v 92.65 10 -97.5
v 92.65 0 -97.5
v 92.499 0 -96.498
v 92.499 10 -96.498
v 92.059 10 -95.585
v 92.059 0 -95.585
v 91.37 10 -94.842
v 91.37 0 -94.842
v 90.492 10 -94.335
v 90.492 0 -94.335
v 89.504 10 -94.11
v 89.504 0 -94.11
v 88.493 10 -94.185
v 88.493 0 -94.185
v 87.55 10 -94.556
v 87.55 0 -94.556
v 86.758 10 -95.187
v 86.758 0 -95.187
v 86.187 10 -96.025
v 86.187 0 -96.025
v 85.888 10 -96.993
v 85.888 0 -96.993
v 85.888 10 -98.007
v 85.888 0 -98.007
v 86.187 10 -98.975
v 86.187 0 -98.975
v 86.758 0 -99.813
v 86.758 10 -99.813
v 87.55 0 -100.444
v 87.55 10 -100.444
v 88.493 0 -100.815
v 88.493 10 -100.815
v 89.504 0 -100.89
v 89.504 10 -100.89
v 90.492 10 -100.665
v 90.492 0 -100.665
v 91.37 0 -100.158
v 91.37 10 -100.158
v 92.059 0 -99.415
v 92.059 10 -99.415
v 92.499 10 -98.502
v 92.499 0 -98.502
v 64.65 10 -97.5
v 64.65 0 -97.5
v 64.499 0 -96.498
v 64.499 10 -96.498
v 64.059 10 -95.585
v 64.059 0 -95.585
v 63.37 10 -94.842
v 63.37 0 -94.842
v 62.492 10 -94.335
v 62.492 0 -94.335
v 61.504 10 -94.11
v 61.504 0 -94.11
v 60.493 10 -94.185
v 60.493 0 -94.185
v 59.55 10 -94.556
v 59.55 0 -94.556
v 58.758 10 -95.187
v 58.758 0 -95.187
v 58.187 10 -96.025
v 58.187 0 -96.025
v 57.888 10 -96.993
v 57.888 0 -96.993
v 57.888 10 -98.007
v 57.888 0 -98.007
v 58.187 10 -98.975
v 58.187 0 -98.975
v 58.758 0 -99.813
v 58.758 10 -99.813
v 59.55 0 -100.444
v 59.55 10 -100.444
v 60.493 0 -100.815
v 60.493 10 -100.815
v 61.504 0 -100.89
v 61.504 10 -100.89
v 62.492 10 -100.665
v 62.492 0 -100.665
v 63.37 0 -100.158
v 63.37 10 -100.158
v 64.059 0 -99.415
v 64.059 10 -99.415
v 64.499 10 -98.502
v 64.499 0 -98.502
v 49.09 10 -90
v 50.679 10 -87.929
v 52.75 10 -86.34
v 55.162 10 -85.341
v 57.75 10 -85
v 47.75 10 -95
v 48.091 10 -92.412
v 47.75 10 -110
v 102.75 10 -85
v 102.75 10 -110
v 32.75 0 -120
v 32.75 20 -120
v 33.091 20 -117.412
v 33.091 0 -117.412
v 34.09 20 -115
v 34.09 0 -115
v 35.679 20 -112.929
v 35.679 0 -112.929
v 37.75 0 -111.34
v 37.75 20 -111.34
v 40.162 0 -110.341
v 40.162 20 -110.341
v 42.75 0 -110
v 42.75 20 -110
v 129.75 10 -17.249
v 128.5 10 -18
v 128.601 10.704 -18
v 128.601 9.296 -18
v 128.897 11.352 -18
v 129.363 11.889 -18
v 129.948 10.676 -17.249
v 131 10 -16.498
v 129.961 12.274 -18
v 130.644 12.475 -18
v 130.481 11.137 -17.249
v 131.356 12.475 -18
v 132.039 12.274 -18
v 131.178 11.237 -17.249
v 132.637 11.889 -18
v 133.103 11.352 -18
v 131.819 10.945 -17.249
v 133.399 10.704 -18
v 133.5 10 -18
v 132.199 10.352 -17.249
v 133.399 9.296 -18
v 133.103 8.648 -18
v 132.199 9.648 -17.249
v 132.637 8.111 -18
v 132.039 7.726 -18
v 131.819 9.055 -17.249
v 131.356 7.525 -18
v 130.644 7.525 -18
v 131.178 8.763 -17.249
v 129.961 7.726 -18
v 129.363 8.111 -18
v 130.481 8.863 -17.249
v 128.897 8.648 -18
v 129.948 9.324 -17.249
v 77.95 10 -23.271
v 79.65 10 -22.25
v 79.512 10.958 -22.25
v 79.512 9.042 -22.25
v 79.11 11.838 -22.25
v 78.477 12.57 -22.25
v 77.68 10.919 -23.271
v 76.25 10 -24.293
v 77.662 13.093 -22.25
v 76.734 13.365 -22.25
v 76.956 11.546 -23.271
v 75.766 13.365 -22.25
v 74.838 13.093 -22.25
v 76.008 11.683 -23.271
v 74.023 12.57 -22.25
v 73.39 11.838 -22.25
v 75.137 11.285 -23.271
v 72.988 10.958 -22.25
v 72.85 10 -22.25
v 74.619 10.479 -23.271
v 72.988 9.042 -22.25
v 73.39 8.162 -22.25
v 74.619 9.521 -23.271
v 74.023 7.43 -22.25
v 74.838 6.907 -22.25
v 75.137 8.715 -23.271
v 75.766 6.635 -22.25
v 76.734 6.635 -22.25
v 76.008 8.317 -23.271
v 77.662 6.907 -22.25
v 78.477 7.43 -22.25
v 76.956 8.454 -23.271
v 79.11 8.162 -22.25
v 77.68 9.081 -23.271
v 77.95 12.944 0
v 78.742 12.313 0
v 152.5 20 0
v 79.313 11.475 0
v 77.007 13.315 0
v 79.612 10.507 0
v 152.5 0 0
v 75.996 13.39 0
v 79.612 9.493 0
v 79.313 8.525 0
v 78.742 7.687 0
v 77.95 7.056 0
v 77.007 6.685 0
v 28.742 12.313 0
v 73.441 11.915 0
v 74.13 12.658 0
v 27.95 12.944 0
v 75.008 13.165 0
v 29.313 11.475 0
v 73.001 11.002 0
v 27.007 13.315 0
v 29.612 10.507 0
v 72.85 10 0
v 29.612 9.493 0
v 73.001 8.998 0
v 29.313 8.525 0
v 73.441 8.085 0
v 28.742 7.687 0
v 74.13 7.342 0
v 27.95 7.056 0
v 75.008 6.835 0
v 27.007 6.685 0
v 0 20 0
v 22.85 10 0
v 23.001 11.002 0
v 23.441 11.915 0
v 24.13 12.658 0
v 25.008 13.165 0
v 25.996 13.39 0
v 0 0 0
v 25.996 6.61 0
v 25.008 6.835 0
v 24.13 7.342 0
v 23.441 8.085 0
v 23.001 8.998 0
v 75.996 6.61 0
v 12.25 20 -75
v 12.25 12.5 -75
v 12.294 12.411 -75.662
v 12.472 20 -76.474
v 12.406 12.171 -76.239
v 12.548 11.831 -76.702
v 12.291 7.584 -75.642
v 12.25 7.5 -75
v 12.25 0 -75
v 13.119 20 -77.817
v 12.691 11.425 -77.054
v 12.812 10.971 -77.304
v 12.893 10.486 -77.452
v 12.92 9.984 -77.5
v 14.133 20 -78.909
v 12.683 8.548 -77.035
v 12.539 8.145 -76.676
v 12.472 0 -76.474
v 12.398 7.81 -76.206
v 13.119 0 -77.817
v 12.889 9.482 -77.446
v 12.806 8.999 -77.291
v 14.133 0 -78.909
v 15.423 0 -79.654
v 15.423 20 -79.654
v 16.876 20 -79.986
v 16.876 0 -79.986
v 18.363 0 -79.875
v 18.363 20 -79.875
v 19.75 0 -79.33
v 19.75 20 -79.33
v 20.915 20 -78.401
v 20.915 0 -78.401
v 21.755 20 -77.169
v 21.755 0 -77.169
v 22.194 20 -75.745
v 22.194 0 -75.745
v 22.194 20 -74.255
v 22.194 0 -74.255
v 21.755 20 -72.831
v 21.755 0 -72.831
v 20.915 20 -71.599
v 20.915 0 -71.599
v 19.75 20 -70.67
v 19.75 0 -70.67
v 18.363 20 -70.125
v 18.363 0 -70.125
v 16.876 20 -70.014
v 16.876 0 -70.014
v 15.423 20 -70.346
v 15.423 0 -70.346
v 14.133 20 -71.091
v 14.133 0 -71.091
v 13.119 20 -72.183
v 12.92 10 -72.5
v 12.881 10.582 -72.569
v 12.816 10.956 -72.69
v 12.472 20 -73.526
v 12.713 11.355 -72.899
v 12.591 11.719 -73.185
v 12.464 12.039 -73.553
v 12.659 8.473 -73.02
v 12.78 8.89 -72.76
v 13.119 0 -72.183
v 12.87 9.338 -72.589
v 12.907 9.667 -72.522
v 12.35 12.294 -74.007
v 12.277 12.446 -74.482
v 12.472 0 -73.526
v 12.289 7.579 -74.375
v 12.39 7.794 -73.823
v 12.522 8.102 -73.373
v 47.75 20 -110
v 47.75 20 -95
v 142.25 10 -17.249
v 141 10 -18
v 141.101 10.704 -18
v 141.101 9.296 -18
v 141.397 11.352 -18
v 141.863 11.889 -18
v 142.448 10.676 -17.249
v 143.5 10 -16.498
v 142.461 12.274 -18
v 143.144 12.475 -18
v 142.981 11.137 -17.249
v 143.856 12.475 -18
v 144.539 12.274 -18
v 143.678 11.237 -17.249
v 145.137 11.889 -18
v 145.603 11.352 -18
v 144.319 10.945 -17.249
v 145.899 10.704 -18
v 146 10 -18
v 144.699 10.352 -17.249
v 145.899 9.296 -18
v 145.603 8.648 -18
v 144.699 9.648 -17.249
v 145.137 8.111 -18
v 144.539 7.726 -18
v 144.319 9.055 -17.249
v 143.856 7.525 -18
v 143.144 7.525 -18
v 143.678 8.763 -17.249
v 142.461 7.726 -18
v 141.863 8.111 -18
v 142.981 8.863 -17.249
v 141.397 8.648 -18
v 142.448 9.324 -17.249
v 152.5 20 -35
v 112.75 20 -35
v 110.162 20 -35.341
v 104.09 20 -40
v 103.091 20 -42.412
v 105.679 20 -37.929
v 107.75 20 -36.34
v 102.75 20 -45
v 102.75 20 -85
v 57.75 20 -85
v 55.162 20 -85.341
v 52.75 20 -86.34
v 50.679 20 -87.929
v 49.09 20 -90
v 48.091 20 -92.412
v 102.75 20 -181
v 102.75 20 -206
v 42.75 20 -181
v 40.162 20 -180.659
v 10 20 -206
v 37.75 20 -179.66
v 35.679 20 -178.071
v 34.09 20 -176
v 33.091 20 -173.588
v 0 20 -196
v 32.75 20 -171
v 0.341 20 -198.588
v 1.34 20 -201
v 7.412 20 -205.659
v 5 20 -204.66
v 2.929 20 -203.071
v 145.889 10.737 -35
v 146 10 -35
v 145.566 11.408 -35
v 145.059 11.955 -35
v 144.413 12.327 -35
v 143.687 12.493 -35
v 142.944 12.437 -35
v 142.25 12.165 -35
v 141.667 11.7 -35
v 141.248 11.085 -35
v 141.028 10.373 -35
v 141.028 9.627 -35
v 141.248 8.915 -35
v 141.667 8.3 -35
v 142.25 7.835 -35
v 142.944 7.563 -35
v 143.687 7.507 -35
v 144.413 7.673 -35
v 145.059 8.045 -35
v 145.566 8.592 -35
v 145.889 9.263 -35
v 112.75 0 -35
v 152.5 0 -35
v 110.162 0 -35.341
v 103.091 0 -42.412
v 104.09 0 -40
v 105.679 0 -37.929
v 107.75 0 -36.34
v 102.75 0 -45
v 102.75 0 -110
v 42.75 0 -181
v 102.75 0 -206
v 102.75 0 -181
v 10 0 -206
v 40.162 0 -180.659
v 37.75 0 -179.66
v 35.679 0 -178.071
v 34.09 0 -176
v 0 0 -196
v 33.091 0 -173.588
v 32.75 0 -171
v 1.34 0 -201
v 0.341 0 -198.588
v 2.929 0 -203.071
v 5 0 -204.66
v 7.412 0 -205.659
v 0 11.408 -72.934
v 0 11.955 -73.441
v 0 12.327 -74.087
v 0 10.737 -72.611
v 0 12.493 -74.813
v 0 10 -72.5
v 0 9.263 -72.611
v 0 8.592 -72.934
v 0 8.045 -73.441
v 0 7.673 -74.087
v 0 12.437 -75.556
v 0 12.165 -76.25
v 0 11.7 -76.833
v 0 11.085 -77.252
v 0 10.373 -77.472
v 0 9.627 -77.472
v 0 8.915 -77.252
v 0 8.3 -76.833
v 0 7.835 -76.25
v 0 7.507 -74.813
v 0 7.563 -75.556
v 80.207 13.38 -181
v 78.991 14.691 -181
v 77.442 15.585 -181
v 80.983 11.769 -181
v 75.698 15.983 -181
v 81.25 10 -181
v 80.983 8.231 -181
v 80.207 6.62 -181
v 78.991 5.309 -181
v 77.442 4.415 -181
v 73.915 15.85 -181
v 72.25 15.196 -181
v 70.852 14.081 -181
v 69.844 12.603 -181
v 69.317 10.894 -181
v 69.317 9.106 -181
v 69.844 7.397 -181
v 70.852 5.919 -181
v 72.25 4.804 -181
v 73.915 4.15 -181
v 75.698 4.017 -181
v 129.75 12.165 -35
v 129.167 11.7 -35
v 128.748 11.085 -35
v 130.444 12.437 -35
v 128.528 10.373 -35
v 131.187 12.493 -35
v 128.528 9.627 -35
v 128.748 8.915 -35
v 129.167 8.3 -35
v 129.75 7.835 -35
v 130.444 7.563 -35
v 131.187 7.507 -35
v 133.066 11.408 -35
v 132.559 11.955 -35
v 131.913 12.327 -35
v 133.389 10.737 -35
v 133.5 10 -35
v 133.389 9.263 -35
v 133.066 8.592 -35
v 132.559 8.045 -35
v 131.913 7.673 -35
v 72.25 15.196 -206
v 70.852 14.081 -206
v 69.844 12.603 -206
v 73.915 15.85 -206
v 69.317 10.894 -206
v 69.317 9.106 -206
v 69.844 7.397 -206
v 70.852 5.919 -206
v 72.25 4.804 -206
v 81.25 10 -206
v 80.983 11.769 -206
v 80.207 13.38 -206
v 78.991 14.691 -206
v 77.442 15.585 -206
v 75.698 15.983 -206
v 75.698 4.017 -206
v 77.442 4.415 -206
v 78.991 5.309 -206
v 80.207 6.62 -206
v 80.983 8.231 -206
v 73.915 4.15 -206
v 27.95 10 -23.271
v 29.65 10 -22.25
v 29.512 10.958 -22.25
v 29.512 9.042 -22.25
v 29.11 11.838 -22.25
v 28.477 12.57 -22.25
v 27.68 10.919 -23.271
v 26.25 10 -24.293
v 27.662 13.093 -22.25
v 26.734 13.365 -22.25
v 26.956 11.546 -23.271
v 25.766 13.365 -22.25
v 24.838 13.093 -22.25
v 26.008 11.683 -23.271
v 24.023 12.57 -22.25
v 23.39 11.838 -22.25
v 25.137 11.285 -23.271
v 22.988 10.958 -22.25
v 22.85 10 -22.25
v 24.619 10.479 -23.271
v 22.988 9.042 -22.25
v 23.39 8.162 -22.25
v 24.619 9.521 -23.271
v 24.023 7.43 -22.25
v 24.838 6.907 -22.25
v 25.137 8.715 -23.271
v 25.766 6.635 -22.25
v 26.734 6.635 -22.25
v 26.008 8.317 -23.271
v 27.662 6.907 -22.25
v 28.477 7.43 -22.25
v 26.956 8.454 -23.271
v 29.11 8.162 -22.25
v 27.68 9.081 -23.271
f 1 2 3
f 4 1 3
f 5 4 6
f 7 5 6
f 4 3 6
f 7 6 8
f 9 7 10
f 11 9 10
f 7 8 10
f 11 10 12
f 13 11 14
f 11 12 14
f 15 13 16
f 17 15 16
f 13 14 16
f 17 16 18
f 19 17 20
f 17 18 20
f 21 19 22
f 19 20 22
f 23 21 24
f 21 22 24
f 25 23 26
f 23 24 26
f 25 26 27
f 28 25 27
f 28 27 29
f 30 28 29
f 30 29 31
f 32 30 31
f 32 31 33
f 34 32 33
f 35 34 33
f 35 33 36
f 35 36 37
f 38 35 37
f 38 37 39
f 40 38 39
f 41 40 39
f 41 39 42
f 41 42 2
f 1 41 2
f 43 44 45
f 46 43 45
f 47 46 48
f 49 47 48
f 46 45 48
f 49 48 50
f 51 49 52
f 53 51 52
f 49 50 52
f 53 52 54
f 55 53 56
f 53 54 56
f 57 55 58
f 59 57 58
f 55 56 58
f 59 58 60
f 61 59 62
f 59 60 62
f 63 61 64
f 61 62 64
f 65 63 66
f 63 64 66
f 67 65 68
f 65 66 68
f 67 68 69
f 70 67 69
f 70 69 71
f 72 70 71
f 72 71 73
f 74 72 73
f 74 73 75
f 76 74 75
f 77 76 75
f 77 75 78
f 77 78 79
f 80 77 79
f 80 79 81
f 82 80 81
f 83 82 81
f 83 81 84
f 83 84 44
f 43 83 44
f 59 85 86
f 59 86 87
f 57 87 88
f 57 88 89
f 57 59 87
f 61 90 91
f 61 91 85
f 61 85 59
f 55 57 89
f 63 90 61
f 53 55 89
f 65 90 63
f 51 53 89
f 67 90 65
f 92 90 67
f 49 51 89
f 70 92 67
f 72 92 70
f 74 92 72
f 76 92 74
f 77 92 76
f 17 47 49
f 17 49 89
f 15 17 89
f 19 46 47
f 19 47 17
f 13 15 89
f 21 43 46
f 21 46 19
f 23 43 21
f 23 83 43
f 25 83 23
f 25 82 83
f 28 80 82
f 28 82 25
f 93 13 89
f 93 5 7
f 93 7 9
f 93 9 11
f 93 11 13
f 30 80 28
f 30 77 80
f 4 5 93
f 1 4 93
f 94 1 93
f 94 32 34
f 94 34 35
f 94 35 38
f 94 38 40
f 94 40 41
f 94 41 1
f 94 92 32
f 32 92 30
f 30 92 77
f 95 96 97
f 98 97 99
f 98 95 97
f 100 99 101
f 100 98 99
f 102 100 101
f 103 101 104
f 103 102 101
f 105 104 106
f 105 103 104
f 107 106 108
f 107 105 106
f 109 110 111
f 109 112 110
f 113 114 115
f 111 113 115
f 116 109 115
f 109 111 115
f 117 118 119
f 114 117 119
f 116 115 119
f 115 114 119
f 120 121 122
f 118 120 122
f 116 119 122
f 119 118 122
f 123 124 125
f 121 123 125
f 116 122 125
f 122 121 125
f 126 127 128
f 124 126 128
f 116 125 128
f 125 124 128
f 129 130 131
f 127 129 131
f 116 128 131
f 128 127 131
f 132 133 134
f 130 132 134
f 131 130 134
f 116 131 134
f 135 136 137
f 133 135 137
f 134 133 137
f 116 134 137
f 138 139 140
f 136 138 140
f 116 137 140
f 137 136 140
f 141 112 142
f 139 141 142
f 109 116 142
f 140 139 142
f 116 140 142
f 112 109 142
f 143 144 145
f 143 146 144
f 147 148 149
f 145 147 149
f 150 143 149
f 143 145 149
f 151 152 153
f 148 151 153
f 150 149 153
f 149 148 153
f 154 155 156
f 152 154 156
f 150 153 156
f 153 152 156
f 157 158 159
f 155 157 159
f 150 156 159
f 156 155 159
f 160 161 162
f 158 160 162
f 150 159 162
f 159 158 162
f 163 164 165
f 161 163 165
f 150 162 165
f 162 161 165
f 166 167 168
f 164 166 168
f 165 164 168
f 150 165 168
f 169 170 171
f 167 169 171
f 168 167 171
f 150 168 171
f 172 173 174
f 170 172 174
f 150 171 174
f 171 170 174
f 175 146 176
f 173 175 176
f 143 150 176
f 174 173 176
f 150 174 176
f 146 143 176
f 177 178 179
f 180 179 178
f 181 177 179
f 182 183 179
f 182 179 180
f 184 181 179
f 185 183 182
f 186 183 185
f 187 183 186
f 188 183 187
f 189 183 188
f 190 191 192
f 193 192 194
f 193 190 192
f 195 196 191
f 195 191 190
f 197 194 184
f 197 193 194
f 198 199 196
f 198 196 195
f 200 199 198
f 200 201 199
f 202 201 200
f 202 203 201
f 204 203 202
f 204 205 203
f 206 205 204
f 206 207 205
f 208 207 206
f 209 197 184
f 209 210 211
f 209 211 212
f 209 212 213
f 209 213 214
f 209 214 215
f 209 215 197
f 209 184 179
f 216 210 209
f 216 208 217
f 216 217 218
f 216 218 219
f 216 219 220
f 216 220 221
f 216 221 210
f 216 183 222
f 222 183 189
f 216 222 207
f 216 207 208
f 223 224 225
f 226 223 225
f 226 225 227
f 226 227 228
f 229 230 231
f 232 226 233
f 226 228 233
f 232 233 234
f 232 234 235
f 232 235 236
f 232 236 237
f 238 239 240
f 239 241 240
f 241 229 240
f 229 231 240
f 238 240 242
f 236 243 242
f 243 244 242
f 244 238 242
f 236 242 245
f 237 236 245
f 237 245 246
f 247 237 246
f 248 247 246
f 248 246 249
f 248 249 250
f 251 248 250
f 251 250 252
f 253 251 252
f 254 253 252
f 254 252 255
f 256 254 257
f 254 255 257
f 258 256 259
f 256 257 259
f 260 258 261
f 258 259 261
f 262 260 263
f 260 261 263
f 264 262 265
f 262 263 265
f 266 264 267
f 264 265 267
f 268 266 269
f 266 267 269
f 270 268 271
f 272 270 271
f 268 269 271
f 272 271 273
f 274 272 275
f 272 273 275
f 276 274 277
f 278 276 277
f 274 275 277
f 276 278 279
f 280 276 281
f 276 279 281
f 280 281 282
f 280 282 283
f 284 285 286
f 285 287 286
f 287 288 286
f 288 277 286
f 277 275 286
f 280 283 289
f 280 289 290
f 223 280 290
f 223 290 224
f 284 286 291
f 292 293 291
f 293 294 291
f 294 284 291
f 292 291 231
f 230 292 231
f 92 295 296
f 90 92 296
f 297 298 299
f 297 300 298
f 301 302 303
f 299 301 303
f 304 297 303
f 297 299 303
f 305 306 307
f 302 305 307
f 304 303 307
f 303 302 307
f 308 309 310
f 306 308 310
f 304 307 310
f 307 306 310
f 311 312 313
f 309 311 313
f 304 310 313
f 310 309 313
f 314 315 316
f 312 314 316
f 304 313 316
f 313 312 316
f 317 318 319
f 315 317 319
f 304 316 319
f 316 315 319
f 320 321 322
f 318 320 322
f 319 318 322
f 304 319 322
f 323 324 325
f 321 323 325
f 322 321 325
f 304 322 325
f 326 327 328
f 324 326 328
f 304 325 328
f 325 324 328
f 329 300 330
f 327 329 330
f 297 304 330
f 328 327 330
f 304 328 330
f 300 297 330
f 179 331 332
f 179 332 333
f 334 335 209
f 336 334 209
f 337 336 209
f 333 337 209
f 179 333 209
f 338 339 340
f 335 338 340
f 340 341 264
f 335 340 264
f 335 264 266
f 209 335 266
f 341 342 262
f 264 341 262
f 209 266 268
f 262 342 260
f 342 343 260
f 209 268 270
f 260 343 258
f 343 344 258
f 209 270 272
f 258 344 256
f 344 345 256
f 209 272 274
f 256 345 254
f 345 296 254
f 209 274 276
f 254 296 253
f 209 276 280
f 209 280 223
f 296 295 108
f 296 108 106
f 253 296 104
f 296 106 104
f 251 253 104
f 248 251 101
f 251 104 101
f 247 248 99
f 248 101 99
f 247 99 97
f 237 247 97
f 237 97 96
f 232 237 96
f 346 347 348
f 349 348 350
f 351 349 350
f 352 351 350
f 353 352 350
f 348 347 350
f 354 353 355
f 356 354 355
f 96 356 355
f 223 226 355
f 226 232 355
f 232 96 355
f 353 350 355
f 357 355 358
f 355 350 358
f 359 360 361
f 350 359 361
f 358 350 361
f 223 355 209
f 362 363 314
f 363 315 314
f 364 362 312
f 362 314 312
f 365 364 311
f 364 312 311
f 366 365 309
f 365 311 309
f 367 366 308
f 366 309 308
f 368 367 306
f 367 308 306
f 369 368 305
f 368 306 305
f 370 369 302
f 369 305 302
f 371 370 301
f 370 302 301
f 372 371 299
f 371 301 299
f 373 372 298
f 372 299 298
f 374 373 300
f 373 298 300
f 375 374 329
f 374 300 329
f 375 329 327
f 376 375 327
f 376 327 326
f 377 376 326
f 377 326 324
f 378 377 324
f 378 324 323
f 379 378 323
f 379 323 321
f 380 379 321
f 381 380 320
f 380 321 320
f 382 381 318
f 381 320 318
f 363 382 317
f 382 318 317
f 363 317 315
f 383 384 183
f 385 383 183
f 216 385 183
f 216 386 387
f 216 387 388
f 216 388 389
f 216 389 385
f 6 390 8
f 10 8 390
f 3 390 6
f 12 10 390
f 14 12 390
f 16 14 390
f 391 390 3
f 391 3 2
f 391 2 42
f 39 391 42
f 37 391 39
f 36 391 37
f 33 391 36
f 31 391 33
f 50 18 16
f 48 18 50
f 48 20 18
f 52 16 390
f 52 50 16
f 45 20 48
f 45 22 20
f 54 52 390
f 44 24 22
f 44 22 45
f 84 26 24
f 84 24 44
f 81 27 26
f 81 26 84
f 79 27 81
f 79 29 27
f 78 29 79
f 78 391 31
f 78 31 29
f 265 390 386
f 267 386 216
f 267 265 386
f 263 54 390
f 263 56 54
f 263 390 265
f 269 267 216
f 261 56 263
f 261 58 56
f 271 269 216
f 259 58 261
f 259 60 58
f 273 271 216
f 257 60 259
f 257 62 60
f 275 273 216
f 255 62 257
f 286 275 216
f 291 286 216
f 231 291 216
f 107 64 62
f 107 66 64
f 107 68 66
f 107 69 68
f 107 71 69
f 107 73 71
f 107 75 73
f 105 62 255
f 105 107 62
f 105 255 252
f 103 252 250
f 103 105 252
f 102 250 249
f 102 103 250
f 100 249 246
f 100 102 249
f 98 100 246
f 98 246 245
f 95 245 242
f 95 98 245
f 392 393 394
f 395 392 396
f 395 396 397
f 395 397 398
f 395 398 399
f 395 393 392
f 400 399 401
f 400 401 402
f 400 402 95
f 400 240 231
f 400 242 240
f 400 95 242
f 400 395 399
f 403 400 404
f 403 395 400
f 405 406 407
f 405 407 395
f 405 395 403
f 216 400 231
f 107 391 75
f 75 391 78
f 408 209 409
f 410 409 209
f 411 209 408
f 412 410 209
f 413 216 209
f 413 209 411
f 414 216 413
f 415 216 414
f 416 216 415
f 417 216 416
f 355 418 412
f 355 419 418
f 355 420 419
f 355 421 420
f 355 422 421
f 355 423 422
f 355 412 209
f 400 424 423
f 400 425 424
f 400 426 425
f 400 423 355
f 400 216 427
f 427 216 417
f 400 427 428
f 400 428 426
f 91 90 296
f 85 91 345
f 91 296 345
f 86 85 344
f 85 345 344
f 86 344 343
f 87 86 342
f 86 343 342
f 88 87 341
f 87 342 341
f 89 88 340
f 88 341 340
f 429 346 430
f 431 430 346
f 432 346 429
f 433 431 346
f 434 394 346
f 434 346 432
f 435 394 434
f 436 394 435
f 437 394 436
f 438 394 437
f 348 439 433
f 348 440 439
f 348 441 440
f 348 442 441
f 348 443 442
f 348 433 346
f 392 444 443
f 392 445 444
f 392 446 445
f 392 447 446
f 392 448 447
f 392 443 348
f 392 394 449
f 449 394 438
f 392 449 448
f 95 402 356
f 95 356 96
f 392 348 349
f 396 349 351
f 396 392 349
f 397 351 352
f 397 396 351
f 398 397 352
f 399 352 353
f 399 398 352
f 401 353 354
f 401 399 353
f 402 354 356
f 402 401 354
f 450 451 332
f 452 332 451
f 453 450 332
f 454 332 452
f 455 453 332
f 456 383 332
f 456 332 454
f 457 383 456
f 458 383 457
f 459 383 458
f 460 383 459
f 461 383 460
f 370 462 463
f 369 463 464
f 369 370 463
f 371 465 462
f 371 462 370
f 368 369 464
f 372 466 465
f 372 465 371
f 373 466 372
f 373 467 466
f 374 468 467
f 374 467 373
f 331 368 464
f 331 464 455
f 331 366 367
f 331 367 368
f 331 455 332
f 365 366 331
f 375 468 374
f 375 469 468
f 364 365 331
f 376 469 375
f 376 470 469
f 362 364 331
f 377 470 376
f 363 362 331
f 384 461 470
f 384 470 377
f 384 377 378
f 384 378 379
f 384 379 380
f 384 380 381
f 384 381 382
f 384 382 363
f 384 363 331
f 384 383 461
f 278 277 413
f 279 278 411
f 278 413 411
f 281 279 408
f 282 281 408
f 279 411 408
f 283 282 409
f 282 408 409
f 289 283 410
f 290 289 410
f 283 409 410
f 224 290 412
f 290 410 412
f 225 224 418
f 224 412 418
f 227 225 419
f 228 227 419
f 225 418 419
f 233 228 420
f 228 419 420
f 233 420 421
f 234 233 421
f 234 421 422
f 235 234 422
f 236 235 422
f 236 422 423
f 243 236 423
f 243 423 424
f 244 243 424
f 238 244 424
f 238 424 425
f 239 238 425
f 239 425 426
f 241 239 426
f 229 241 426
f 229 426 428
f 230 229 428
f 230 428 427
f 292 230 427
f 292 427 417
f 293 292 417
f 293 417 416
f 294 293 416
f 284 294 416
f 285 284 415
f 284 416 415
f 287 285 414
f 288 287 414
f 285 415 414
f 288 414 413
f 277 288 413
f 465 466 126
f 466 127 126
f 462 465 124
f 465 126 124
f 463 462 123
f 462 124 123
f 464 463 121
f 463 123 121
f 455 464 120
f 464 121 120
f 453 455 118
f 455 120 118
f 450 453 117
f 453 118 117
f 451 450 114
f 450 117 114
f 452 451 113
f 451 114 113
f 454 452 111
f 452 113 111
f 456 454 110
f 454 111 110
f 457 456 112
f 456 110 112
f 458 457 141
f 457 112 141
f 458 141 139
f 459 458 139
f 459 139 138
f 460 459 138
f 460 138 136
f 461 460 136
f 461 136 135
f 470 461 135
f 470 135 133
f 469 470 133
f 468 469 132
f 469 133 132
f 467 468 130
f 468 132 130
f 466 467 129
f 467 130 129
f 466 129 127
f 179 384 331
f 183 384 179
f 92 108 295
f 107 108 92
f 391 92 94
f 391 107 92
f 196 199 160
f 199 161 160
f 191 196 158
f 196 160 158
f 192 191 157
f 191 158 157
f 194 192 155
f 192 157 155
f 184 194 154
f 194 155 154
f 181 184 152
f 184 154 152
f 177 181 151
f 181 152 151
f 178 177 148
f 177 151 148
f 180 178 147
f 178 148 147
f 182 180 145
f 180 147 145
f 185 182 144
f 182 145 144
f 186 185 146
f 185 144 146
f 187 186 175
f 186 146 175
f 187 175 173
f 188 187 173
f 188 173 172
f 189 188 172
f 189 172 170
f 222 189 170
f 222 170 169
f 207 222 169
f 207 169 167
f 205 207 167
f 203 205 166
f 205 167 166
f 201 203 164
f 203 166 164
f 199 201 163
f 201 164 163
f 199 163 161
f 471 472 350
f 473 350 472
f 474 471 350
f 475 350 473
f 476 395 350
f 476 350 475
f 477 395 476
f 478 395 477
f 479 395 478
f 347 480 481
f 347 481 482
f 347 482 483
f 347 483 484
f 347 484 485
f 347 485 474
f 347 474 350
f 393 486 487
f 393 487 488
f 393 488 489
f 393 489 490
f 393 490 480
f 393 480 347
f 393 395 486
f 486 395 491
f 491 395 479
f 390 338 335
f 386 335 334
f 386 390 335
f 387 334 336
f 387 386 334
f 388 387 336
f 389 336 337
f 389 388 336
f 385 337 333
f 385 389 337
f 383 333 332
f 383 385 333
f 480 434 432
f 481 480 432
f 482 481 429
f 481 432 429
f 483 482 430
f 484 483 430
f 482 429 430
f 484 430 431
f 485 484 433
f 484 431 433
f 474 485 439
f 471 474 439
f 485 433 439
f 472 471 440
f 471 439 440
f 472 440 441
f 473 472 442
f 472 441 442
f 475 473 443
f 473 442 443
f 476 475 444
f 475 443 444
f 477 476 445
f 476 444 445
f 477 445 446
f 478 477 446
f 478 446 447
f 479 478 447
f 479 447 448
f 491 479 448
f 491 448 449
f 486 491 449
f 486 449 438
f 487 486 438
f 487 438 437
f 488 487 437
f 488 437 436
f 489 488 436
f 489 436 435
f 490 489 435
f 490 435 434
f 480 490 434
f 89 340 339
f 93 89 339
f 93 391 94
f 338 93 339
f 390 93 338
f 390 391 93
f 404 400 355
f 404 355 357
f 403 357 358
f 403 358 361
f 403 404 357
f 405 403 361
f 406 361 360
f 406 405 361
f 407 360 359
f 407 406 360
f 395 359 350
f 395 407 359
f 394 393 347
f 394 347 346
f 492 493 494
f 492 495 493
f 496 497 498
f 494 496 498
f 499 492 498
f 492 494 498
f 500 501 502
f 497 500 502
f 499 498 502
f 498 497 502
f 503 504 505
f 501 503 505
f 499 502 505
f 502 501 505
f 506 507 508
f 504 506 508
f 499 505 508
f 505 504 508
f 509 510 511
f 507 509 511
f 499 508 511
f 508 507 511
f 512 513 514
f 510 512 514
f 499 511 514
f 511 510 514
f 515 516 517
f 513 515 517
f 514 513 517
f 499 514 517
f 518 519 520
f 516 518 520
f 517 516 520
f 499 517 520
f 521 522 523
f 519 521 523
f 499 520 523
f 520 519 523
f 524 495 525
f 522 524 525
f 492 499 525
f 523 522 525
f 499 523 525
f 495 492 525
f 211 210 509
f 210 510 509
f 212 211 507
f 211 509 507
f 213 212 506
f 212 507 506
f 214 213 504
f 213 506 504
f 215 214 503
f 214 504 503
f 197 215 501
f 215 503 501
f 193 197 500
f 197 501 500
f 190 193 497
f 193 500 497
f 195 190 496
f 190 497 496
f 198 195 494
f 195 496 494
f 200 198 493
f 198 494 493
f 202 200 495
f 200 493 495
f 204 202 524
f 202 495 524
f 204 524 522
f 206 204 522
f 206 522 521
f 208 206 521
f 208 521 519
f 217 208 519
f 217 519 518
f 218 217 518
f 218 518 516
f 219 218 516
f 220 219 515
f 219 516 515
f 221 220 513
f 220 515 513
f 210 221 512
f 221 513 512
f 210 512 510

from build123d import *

# Parameters (mm, degrees)
LINEAR_AUSTRAGEN1_DEPTH              = 20
LINEAR_AUSTRAGEN2_DEPTH              = 10
F_12_0_12_DURCHMESSER_BOHRUNG1_D     = 12
F_12_0_12_DURCHMESSER_BOHRUNG1_DEPTH = 25
F_10_0_10_DURCHMESSER_BOHRUNG1_D     = 10
M6_GEWINDEBOHRUNG1_REACH             = 154.5
M6_GEWINDEBOHRUNG1_BORE_R            = 2.5
M8_GEWINDEBOHRUNG1_D                 = 6.8
M8_GEWINDEBOHRUNG1_DEPTH             = 22.25
M8_GEWINDEBOHRUNG1_TIP               = 2.042926105
M6_GEWINDEBOHRUNG3_D                 = 5
M6_GEWINDEBOHRUNG3_DEPTH             = 17
M6_GEWINDEBOHRUNG3_TIP               = 1.502151548
M8_GEWINDEBOHRUNG2_D                 = 6.8
M8_GEWINDEBOHRUNG2_DEPTH             = 22.25
M8_GEWINDEBOHRUNG2_TIP               = 2.042926105


with BuildPart() as part:
    # Skizze1 → Linear austragen1 (new body)
    with BuildSketch(Plane(origin=(0, 0, 0), x_dir=(1, 0, 0), z_dir=(0, 1, 0))):
        with BuildLine():
            Line((0, 0), (0, 196))
            ThreePointArc((0, 196), (2.928932188, 203.071067812), (10, 206))
            Line((10, 206), (102.75, 206))
            Line((102.75, 206), (102.75, 181))
            Line((102.75, 181), (42.75, 181))
            ThreePointArc((42.75, 181), (35.678932188, 178.071067812), (32.75, 171))
            Line((32.75, 171), (32.75, 120))
            ThreePointArc((32.75, 120), (35.678932188, 112.928932188), (42.75, 110))
            Line((42.75, 110), (102.75, 110))
            Line((102.75, 110), (102.75, 45))
            ThreePointArc((102.75, 45), (105.678932188, 37.928932188), (112.75, 35))
            Line((112.75, 35), (152.5, 35))
            Line((152.5, 35), (152.5, 0))
            Line((152.5, 0), (102.75, 0))
            Line((102.75, 0), (0, 0))
        make_face()
    extrude(amount=LINEAR_AUSTRAGEN1_DEPTH)

    # Skizze20 → Linear austragen2 (cut)
    with BuildSketch(Plane(origin=(0, 20, 0), x_dir=(1, 0, 0), z_dir=(0, 1, 0))):
        with BuildLine():
            Line((47.75, 110), (47.75, 95))
            ThreePointArc((47.75, 95), (50.678932188, 87.928932188), (57.75, 85))
            Line((57.75, 85), (102.75, 85))
            Line((102.75, 85), (102.75, 110))
            Line((102.75, 110), (47.75, 110))
        make_face()
    extrude(amount=-LINEAR_AUSTRAGEN2_DEPTH, mode=Mode.SUBTRACT)

    # Ø12.0 (12) Durchmesser Bohrung1
    with Locations(Plane(origin=(0, 0, -206), x_dir=(-1, 0, 0), z_dir=(0, 0, -1))):
        with Locations((-75.25, 10)):
            Hole(F_12_0_12_DURCHMESSER_BOHRUNG1_D / 2, depth=F_12_0_12_DURCHMESSER_BOHRUNG1_DEPTH)

    # Ø10.0 (10) Durchmesser Bohrung1 (through all)
    with Locations(Plane(origin=(51, 20, 10), x_dir=(1, 0, 0), z_dir=(0, 1, 0))):
        with Locations((-33.75, 85)):
            Hole(F_10_0_10_DURCHMESSER_BOHRUNG1_D / 2)

    # M6 Gewindebohrung1 bore → M6 Gewindebohrung1 (cut, up to next)
    with BuildSketch(Plane.ZY, mode=Mode.PRIVATE) as m6_gewindebohrung1_sk1:
        with Locations((-75, 10)):
            Circle(M6_GEWINDEBOHRUNG1_BORE_R)
    m6_gewindebohrung1_tool1 = extrude(m6_gewindebohrung1_sk1.sketch, amount=-M6_GEWINDEBOHRUNG1_REACH, mode=Mode.PRIVATE) & part.part
    add(m6_gewindebohrung1_tool1.solids().sort_by_distance((0, 10, -75))[0], mode=Mode.SUBTRACT)

    # M8 Gewindebohrung1
    with Locations(Plane(origin=(51.25, 10, 0), x_dir=(1, 0, 0), z_dir=(0, 0, 1))):
        with Locations((-25, 0), (25, 0)):
            Hole(M8_GEWINDEBOHRUNG1_D / 2, depth=M8_GEWINDEBOHRUNG1_DEPTH)
            with Locations((0, 0, -(M8_GEWINDEBOHRUNG1_DEPTH + M8_GEWINDEBOHRUNG1_TIP / 2))):  # 118° drill point
                Cone(0, M8_GEWINDEBOHRUNG1_D / 2, M8_GEWINDEBOHRUNG1_TIP, mode=Mode.SUBTRACT)

    # M6 Gewindebohrung3
    with Locations(Plane(origin=(6.209471485, 2.149988387, -35), x_dir=(-1, 0, 0), z_dir=(0, 0, -1))):
        with Locations((-137.290528515, 7.850011613), (-124.790528515, 7.850011613)):
            Hole(M6_GEWINDEBOHRUNG3_D / 2, depth=M6_GEWINDEBOHRUNG3_DEPTH)
            with Locations((0, 0, -(M6_GEWINDEBOHRUNG3_DEPTH + M6_GEWINDEBOHRUNG3_TIP / 2))):  # 118° drill point
                Cone(0, M6_GEWINDEBOHRUNG3_D / 2, M6_GEWINDEBOHRUNG3_TIP, mode=Mode.SUBTRACT)

    # M8 Gewindebohrung2
    with Locations(Plane(origin=(0, 10, 0), x_dir=(-1, 0, 0), z_dir=(0, 1, 0))):
        with Locations((-61.25, -97.5), (-89.25, -97.5)):
            Hole(M8_GEWINDEBOHRUNG2_D / 2, depth=M8_GEWINDEBOHRUNG2_DEPTH)
            with Locations((0, 0, -(M8_GEWINDEBOHRUNG2_DEPTH + M8_GEWINDEBOHRUNG2_TIP / 2))):  # 118° drill point
                Cone(0, M8_GEWINDEBOHRUNG2_D / 2, M8_GEWINDEBOHRUNG2_TIP, mode=Mode.SUBTRACT)


solid = part.part
